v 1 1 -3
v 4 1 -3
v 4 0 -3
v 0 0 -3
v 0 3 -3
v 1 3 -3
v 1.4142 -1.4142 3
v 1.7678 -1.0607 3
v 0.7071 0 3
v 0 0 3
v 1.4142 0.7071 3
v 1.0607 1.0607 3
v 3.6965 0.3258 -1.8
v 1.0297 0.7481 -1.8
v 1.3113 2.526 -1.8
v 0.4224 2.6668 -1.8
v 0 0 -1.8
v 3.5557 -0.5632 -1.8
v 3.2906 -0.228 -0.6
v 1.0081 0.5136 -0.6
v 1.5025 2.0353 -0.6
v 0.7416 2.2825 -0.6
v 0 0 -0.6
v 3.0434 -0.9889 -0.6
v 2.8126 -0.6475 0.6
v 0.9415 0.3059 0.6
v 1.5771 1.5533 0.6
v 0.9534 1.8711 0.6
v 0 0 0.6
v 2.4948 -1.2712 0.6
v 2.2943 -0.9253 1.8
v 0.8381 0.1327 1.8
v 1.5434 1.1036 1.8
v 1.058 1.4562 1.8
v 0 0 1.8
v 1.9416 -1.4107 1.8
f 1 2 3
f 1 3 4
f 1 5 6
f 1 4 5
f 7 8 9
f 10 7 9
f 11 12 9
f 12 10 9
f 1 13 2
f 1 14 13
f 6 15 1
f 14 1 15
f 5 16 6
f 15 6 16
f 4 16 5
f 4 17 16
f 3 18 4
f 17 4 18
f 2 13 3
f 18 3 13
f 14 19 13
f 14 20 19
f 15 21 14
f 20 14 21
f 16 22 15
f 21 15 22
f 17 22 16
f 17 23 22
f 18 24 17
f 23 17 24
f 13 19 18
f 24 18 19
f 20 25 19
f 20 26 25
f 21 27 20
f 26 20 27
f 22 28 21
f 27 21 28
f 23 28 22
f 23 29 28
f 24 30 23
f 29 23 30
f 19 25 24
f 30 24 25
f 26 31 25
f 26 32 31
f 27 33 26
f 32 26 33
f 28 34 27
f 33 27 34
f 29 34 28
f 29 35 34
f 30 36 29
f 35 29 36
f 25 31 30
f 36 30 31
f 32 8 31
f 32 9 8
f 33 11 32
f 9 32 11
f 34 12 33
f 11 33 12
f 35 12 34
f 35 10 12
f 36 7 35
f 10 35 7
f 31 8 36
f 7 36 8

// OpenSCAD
// twist, scale and center together
linear_extrude(height = 6, center = true, twist = 45, scale = 0.5, slices = 5)
  polygon([[0, 0], [4, 0], [4, 1], [1, 1], [1, 3], [0, 3]]);
